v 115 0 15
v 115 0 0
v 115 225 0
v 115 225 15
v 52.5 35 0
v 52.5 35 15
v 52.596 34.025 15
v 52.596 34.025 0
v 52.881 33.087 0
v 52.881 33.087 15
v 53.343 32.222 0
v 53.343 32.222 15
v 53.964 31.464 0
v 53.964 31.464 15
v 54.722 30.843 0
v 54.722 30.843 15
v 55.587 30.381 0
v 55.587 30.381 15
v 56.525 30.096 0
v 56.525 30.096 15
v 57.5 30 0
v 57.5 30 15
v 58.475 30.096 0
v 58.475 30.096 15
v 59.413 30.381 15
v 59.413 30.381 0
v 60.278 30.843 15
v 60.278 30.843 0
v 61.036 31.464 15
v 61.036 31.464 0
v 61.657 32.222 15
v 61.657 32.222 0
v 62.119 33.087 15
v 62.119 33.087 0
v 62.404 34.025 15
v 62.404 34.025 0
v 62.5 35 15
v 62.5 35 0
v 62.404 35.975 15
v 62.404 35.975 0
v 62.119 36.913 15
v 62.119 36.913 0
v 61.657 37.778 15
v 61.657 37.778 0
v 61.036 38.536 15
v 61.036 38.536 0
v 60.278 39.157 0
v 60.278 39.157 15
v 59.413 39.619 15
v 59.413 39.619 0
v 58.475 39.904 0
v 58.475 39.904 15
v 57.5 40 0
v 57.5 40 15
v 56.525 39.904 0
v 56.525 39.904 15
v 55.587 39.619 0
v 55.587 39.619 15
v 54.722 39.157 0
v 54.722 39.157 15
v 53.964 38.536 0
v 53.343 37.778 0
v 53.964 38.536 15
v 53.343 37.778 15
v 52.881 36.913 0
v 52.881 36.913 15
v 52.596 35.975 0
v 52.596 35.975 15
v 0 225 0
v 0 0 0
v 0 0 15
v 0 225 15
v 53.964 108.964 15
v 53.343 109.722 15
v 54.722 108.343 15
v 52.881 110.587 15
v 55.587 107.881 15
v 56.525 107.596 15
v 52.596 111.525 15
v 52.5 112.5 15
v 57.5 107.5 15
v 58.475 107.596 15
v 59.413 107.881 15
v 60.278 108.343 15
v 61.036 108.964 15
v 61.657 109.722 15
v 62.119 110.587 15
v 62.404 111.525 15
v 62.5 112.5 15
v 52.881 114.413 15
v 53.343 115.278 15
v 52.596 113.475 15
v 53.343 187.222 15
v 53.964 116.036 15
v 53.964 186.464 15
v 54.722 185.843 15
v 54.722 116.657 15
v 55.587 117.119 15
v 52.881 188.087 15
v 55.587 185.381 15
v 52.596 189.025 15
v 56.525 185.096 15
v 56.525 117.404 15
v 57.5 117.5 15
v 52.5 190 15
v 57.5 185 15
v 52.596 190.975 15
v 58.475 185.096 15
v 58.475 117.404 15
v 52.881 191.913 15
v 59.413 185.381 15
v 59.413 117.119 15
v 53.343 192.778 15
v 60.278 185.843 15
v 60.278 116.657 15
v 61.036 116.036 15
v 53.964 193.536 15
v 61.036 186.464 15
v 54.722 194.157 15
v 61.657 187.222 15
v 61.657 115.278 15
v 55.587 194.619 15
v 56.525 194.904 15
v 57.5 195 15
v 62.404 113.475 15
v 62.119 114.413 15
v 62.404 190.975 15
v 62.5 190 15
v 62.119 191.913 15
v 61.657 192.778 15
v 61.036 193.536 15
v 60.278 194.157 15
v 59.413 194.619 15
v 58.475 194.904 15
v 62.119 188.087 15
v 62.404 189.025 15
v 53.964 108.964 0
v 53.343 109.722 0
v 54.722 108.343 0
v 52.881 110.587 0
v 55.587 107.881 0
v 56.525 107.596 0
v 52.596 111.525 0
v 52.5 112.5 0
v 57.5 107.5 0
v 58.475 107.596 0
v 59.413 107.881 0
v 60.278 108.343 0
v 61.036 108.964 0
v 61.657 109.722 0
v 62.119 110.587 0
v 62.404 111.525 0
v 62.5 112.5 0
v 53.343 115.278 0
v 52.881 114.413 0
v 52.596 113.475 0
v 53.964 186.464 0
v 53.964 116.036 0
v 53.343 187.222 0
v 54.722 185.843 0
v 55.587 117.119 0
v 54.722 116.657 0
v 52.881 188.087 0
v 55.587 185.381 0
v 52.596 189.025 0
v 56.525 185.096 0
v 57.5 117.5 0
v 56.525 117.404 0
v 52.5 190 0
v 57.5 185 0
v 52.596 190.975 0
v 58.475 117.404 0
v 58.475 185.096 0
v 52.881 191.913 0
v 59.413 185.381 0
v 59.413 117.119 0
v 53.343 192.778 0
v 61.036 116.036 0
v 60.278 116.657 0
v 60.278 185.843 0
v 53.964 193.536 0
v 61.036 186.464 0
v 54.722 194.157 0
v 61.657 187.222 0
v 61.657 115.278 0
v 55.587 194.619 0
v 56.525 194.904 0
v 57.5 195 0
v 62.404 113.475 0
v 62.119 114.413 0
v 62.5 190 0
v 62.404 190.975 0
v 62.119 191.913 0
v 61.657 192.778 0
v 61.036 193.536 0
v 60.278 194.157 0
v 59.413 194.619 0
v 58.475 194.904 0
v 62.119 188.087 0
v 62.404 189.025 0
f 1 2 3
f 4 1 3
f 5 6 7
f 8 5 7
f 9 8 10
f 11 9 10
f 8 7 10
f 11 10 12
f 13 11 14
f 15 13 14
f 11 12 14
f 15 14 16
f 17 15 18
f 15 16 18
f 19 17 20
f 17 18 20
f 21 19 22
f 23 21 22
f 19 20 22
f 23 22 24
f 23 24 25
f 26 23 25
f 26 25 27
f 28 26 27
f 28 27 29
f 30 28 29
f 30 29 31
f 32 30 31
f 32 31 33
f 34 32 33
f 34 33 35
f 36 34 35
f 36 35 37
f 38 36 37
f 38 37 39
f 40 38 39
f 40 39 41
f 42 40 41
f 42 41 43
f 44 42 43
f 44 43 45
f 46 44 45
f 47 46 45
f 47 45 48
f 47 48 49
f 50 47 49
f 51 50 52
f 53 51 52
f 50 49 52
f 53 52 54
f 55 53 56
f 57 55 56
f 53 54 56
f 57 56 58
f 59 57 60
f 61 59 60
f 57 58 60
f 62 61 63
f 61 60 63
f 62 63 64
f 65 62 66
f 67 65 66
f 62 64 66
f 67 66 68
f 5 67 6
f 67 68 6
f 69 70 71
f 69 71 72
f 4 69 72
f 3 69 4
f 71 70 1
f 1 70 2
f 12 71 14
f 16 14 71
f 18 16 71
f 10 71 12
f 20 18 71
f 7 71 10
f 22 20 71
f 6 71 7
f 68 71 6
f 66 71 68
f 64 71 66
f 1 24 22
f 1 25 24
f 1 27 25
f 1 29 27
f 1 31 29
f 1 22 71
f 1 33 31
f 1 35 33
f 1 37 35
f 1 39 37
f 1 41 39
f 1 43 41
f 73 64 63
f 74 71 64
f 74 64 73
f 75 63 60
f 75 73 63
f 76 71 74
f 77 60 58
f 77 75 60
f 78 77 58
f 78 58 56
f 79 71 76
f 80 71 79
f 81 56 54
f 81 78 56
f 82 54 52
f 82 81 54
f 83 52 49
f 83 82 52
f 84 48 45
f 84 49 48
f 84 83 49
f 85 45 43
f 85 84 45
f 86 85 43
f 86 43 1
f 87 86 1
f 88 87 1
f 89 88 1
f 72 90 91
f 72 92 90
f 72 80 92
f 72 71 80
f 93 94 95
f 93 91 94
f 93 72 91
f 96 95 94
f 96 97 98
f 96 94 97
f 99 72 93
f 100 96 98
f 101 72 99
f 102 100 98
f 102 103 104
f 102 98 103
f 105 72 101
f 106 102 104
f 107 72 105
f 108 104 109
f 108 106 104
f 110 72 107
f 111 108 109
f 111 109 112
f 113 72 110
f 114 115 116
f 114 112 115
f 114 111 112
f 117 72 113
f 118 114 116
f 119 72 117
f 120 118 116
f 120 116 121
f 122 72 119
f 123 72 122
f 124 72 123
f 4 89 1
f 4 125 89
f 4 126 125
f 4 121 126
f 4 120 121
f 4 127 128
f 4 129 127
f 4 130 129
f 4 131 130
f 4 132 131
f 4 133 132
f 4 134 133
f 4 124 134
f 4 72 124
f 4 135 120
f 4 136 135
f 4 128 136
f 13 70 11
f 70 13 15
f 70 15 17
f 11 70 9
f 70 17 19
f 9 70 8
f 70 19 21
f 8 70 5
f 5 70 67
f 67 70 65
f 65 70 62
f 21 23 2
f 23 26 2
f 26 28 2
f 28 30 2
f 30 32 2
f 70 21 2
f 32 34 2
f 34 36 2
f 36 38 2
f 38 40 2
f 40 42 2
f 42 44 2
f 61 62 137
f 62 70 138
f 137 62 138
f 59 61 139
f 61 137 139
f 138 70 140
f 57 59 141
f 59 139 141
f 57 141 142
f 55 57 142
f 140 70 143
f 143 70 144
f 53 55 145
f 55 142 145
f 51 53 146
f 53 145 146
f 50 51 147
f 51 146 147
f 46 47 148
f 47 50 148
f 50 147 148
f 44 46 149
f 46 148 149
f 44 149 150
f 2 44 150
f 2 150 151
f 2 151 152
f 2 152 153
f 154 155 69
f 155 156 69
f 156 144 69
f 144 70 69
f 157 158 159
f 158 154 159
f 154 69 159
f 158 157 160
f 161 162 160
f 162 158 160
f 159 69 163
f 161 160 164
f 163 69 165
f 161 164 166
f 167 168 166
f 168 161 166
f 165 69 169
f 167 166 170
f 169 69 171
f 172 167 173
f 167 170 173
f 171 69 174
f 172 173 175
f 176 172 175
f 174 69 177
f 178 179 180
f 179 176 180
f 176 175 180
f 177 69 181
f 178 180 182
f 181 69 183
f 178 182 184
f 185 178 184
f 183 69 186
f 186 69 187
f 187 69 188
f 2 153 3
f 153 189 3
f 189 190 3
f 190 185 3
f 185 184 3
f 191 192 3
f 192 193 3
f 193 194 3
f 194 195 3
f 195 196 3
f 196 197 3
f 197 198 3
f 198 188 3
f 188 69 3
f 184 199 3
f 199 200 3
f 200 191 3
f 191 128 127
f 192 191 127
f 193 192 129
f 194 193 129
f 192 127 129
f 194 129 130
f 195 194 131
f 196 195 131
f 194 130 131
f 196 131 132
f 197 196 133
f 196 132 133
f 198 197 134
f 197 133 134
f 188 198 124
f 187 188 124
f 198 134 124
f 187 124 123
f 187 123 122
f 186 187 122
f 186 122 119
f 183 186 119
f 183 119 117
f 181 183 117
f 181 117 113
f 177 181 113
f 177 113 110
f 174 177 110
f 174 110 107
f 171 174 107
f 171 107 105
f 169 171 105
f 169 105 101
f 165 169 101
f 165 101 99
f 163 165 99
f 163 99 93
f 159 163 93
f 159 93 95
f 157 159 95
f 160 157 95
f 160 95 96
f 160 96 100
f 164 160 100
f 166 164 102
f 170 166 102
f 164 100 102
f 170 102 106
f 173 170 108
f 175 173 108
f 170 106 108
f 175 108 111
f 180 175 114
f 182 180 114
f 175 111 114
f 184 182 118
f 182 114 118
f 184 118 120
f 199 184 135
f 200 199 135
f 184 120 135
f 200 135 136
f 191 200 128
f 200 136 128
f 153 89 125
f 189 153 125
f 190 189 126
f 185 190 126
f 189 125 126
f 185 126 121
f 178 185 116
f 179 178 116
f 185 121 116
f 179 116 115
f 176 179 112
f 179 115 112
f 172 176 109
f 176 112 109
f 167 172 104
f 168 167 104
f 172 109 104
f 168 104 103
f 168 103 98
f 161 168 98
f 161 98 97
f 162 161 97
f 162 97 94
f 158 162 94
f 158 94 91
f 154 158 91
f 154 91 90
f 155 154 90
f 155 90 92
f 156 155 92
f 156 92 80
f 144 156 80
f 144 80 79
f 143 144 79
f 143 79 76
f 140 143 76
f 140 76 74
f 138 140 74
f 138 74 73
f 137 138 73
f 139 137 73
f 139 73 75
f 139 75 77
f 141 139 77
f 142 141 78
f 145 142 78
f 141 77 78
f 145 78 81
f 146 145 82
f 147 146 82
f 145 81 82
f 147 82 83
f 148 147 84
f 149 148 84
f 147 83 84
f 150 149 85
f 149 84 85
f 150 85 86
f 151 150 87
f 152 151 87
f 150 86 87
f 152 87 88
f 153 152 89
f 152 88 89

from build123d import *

# Parameters (mm, degrees)
ESBO_O1_W                = 115
ESBO_O1_H                = 225
RESSALTO_EXTRUS_O1_DEPTH = 15
ESBO_O2_R                = 5
CORTE_EXTRUS_O1_DEPTH    = 254.130401177


with BuildPart() as part:
    # Esboço1 → Ressalto-extrusão1 (new body)
    with BuildSketch(Plane.XY):
        with Locations((57.5, 112.5)):
            Rectangle(ESBO_O1_W, ESBO_O1_H)
    extrude(amount=RESSALTO_EXTRUS_O1_DEPTH)

    # Esboço2 → Corte-extrusão1 (cut, through all)
    with BuildSketch(Plane.XY.offset(15)):
        with Locations((57.5, 190)):
            Circle(ESBO_O2_R)
        with Locations((57.5, 112.5)):
            Circle(ESBO_O2_R)
        with Locations(Location((57.5, 35, 0), (0, 0, 180))):
            Circle(ESBO_O2_R)
    extrude(amount=-CORTE_EXTRUS_O1_DEPTH, mode=Mode.SUBTRACT)


solid = part.part
